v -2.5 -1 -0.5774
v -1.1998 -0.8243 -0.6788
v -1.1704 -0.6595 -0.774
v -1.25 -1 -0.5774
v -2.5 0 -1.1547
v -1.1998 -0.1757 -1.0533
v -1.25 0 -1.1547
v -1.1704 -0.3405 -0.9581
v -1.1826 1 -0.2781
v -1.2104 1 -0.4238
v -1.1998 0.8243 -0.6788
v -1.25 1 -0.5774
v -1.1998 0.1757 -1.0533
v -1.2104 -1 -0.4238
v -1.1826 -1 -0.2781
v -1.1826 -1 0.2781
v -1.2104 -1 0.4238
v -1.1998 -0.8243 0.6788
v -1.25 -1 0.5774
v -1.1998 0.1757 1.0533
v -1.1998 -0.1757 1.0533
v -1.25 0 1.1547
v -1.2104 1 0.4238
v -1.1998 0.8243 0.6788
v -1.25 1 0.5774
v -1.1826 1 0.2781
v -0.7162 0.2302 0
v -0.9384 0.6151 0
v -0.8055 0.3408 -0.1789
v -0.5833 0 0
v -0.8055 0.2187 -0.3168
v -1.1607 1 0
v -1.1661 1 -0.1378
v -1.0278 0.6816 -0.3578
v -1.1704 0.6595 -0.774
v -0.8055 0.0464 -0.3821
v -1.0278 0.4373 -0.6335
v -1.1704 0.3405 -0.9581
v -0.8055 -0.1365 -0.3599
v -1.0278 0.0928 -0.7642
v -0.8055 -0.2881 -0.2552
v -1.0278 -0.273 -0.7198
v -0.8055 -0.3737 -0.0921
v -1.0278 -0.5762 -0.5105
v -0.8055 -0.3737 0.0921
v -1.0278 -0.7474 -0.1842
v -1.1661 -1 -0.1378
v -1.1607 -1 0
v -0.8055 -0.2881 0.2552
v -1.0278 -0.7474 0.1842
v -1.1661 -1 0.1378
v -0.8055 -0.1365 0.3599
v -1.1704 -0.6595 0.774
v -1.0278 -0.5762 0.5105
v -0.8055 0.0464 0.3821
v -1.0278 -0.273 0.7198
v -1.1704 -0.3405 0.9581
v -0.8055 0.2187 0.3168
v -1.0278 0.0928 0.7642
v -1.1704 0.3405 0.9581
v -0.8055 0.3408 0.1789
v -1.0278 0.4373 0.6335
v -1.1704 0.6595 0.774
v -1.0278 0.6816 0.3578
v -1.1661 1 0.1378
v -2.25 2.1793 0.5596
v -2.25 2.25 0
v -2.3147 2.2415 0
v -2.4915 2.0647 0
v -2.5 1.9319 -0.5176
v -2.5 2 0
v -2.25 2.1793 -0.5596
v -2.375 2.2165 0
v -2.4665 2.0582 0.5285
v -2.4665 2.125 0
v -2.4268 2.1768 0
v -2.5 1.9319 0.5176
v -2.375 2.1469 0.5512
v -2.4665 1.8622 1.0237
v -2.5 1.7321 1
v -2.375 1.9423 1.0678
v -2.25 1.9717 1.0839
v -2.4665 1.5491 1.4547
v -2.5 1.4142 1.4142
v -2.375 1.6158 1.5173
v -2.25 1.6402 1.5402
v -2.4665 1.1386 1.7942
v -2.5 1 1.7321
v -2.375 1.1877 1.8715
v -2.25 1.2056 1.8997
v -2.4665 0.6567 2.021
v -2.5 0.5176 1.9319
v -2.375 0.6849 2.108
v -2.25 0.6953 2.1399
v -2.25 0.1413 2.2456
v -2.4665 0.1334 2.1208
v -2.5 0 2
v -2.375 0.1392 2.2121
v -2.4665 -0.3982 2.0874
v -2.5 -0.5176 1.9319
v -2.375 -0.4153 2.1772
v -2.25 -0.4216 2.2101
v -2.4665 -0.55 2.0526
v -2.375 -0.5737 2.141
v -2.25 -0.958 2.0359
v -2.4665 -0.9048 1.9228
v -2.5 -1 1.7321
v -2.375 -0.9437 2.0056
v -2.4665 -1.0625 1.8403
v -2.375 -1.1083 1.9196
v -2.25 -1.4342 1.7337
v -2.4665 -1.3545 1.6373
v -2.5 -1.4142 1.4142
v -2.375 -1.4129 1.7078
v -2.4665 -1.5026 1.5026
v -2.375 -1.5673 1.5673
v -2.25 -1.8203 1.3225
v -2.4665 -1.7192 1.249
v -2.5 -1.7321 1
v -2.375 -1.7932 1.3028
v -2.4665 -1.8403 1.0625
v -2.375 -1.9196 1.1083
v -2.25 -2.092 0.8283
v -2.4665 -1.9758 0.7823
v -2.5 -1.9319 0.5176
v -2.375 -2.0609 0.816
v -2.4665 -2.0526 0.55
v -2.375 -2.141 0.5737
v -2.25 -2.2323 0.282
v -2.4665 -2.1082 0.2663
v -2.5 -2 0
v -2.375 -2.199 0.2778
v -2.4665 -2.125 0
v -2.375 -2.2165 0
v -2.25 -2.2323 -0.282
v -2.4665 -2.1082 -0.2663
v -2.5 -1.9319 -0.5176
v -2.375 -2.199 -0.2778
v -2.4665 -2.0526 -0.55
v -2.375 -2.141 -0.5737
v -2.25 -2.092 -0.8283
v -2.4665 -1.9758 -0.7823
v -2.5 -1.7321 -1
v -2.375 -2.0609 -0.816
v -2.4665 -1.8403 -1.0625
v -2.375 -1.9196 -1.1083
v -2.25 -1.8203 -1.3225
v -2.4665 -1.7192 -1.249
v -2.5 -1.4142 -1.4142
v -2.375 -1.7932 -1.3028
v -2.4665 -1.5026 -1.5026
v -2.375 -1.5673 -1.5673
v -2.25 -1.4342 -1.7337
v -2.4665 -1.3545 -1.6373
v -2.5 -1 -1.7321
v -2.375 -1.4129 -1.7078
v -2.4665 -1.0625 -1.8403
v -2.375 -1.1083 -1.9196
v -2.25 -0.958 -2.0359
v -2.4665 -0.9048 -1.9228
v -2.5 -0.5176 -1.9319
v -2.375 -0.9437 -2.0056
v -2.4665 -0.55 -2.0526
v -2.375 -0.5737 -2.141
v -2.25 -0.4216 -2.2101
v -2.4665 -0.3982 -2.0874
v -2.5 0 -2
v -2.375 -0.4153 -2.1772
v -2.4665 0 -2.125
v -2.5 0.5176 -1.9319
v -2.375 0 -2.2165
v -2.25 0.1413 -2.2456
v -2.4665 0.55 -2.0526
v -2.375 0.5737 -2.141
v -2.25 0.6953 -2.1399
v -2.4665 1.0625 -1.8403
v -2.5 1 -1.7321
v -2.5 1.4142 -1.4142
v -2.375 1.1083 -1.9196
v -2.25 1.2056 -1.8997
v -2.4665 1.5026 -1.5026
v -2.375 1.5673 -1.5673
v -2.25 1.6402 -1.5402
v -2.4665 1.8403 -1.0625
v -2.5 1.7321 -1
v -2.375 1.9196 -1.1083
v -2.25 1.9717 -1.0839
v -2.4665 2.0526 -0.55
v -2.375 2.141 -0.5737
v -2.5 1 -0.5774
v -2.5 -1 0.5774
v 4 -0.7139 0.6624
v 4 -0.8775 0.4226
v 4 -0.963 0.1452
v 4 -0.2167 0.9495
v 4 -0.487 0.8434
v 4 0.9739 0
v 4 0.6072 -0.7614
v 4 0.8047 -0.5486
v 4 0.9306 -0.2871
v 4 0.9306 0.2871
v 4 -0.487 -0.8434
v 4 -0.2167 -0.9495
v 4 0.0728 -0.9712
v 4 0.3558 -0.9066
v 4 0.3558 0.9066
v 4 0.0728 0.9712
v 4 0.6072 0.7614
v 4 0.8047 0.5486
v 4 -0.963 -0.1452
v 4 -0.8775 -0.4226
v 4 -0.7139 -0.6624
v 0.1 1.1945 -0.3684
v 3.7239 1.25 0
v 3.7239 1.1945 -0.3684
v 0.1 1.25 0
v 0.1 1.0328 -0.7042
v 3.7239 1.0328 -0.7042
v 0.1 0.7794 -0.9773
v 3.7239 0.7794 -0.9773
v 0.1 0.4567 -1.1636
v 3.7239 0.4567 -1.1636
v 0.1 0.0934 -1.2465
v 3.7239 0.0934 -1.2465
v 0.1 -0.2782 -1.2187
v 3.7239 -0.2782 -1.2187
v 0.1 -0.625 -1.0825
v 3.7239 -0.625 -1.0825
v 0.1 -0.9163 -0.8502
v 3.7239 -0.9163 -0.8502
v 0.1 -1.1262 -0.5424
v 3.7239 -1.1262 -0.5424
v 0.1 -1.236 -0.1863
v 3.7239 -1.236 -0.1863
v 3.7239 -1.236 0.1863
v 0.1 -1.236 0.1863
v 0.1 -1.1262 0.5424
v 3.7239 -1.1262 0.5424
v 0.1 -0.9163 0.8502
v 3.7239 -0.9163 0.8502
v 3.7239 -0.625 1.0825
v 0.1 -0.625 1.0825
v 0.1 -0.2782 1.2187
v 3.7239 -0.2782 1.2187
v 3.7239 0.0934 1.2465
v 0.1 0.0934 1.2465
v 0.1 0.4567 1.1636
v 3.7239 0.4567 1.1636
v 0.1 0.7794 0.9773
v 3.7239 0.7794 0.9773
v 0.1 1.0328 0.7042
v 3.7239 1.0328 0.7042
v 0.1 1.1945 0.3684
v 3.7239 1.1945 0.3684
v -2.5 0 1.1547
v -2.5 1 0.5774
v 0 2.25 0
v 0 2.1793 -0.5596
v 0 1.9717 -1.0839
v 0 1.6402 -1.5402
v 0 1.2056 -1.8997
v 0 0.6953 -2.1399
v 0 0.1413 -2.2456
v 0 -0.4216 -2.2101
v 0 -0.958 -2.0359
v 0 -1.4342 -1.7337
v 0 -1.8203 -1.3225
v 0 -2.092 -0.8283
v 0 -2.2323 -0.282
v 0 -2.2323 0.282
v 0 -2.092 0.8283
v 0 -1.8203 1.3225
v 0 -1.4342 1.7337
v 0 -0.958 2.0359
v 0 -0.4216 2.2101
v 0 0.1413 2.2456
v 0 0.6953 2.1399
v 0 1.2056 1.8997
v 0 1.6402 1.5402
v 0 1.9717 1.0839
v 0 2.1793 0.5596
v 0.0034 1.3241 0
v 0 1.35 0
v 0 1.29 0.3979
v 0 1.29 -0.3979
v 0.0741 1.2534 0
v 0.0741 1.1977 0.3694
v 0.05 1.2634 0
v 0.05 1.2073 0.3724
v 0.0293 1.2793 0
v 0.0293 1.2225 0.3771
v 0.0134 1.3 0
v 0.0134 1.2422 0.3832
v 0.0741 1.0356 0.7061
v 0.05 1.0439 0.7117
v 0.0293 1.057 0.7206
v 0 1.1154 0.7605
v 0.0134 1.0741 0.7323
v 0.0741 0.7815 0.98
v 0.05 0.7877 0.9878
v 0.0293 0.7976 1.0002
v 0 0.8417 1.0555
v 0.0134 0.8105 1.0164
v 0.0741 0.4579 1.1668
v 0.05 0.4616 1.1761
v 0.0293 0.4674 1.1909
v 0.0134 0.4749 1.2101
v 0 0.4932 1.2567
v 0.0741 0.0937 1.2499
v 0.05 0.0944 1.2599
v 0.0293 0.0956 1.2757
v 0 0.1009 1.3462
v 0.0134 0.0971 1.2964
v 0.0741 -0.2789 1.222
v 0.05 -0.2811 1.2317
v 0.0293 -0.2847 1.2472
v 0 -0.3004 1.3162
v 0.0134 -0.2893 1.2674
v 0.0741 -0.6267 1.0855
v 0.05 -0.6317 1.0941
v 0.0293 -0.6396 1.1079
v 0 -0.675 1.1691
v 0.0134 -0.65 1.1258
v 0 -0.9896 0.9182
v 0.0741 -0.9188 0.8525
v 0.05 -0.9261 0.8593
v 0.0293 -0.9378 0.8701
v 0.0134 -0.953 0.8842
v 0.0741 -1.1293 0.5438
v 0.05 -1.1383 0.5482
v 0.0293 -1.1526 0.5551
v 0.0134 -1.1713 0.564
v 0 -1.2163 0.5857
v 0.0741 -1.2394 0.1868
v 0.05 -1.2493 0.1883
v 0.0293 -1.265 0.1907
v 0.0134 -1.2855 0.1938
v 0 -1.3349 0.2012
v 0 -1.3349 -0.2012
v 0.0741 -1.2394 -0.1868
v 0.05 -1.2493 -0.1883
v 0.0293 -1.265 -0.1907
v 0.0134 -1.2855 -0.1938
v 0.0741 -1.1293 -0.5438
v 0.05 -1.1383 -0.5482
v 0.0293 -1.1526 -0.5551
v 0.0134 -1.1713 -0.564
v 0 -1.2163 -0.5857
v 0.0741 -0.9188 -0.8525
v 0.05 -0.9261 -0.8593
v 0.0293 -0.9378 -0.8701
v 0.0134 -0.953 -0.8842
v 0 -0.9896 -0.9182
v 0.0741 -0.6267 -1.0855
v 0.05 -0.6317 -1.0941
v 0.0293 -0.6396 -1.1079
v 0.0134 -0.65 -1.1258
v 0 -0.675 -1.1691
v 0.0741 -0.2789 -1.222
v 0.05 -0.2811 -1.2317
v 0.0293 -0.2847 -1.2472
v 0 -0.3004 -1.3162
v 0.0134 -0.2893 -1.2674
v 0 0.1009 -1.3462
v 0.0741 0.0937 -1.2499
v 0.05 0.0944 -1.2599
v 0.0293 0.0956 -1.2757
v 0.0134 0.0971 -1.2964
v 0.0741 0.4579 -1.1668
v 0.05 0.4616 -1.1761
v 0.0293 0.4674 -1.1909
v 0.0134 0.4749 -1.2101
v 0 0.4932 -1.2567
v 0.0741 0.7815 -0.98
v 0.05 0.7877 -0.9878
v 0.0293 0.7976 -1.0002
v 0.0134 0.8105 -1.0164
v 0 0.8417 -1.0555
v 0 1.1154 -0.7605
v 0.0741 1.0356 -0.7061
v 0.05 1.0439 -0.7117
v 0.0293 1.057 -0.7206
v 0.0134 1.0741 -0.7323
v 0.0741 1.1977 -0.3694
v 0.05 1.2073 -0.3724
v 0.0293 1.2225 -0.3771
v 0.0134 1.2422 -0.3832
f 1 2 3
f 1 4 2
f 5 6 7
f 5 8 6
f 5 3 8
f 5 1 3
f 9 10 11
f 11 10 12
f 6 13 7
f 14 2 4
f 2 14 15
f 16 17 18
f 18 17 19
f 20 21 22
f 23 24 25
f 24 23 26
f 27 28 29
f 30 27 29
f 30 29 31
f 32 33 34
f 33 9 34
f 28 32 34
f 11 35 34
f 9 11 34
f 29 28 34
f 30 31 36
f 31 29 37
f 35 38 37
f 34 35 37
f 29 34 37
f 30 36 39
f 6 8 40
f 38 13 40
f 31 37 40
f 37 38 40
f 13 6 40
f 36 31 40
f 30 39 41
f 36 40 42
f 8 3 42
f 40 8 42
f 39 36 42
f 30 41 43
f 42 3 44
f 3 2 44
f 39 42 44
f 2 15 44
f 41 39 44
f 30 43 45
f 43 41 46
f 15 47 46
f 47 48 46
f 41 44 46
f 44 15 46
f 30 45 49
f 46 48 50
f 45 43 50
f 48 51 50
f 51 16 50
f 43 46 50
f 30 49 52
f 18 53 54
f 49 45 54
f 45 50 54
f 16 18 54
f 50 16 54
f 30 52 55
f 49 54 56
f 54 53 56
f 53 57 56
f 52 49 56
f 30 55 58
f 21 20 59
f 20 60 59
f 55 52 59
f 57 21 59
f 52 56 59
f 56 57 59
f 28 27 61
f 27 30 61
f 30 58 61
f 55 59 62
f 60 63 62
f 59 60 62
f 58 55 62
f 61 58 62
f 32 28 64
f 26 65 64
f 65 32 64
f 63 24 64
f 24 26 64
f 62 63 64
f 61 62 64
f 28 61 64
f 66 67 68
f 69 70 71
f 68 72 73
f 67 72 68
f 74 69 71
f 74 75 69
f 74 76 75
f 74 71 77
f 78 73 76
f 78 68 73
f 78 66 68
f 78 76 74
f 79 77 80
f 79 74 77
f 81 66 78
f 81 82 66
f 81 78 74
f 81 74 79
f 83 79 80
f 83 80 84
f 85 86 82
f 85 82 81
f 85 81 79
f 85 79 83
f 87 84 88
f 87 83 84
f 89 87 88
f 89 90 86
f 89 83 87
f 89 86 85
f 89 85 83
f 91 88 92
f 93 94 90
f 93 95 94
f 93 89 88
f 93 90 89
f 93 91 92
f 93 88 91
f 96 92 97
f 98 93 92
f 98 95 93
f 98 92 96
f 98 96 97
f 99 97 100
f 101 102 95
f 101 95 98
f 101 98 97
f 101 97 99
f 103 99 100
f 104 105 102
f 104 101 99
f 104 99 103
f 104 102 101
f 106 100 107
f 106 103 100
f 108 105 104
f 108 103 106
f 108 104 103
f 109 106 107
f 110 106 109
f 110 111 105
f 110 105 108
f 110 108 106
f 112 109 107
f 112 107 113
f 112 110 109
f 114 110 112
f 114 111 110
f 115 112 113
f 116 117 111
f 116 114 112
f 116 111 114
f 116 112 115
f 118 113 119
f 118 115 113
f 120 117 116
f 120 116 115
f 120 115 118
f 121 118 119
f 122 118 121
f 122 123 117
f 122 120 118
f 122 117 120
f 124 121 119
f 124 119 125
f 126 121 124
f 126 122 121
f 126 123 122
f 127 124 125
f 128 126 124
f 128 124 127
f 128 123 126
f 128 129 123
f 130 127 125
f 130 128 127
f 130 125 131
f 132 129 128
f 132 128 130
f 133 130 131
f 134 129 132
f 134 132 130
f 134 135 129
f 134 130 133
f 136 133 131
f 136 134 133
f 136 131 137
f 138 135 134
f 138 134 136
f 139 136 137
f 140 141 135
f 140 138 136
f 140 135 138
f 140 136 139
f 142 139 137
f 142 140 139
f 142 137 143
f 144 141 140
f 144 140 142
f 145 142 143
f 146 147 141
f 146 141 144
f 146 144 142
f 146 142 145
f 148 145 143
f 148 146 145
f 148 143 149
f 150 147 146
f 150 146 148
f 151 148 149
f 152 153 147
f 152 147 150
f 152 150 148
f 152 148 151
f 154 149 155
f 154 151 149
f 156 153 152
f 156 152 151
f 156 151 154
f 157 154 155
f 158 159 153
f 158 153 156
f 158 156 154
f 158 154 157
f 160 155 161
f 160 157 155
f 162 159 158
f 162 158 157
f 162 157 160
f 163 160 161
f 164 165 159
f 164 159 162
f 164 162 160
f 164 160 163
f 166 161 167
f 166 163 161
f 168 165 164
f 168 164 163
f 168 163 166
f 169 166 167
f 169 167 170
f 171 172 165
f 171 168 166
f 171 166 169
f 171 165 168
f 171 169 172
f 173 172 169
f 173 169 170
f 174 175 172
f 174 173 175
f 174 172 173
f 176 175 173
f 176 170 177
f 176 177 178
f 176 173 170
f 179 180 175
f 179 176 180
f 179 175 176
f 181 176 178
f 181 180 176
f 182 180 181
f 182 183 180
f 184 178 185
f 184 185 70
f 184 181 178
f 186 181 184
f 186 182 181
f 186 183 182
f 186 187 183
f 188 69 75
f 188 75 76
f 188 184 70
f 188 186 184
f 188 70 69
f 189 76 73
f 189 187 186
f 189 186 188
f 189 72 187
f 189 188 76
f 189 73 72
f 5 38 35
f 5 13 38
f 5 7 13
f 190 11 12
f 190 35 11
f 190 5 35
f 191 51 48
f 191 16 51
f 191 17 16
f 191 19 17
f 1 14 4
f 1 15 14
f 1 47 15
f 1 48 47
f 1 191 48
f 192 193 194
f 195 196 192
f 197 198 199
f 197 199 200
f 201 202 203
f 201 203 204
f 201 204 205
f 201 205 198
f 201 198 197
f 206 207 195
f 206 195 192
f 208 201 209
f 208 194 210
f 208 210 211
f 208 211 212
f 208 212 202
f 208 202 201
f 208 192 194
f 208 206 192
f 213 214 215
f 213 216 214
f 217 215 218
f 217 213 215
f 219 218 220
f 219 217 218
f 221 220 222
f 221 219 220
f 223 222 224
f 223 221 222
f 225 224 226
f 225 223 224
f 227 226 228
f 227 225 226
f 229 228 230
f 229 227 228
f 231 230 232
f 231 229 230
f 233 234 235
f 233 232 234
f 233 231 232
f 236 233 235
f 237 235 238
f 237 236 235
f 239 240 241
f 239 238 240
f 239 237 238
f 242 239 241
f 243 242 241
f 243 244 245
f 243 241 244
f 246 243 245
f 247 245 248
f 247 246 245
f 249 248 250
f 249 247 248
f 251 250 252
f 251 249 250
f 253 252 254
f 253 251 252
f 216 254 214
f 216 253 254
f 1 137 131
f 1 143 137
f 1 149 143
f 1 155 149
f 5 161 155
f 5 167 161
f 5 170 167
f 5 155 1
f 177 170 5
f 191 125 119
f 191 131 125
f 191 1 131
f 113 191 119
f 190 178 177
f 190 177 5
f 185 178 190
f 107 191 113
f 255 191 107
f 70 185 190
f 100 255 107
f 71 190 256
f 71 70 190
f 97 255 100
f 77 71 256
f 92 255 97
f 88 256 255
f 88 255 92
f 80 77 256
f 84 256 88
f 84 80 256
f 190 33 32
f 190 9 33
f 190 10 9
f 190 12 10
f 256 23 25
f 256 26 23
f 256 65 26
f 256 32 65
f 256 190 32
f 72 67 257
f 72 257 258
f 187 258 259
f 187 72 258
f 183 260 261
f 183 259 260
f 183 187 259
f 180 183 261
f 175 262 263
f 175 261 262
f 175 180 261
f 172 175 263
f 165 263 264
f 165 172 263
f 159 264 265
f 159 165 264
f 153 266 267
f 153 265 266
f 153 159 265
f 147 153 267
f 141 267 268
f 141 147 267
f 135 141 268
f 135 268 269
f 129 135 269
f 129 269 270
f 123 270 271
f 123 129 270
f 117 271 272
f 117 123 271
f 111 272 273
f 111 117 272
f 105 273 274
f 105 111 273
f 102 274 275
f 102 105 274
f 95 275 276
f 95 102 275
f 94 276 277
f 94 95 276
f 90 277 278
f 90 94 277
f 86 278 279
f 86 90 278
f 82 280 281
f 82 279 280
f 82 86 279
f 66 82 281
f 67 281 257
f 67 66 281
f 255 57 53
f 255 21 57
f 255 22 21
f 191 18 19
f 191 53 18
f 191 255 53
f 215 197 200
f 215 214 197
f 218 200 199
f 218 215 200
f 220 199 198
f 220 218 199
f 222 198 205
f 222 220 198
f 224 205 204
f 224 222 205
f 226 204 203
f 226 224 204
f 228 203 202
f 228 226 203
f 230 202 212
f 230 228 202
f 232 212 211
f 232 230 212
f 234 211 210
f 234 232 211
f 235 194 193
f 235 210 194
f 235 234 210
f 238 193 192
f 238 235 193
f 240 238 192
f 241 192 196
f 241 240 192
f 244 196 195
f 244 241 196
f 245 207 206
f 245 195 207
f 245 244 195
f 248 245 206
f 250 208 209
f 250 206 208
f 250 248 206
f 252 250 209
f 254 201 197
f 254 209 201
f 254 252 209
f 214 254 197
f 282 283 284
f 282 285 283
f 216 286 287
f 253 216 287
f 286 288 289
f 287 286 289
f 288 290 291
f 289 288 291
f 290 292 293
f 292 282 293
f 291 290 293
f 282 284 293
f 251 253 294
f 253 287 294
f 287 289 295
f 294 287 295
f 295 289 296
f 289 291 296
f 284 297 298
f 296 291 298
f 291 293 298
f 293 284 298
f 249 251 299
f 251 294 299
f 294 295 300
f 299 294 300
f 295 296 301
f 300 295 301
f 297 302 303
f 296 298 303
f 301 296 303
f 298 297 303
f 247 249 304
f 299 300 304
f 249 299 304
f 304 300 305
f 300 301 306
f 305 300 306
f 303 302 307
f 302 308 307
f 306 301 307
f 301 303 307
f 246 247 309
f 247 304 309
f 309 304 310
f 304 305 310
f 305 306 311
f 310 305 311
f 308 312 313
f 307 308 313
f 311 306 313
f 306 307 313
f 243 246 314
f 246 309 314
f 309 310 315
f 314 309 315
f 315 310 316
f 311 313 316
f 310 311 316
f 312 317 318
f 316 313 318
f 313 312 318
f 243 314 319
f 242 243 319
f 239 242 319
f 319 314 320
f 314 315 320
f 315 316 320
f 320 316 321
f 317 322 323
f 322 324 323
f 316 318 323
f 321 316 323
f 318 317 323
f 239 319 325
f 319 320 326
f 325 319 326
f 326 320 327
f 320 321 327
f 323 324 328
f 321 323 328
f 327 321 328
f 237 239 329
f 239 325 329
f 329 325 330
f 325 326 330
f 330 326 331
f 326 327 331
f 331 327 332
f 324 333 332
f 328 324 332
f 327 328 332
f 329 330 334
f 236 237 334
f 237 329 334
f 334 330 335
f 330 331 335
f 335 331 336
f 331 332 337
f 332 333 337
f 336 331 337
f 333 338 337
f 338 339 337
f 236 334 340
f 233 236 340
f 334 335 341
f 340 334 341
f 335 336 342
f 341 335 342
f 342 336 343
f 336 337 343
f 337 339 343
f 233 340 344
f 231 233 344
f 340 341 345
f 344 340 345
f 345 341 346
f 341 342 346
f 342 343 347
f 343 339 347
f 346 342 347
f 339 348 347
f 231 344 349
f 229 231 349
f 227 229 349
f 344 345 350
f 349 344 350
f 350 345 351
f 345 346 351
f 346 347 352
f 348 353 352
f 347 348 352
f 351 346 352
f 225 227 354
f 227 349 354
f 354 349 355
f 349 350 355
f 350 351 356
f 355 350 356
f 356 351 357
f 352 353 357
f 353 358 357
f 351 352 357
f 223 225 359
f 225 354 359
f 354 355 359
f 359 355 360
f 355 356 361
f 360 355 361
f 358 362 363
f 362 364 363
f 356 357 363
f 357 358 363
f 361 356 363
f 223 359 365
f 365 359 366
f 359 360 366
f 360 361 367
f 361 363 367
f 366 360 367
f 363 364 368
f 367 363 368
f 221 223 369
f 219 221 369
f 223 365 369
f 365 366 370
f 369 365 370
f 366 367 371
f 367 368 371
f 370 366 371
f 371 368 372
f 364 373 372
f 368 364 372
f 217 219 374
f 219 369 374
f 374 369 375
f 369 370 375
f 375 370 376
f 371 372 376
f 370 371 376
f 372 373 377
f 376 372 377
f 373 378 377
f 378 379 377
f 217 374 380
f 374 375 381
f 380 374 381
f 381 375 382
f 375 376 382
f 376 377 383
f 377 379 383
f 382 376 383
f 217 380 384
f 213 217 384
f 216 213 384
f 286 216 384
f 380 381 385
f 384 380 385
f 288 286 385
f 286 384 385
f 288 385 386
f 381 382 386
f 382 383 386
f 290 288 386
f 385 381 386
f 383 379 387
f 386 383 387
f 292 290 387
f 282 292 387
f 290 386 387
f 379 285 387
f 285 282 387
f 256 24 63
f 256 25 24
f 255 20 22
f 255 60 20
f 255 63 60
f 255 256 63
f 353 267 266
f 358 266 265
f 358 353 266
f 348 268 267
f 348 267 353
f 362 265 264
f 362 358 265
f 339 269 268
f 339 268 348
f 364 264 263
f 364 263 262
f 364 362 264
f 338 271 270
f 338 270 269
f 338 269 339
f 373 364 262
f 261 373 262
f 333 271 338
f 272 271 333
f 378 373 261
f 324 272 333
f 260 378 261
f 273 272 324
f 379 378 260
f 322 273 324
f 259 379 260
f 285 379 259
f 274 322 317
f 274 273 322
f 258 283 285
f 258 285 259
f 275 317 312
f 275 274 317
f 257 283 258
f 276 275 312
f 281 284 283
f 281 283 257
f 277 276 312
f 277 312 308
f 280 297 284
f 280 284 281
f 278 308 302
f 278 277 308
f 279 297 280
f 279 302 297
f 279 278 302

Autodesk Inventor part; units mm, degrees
ref_plane "YZ Plane" through (0, 0, 0) normal (1, 0, 0) x (0, 1, 0)
ref_plane "XZ Plane" through (0, 0, 0) normal (0, 1, 0) x (-1, 0, 0)
sketch "Sketch1" plane through (0, 0, 0) normal (0, 0, 1) x (1, 0, 0)
  line L0 (-0.5833, 0) -> (4, 0)
  line L1 (4, 0) -> (4, 1.25)
  line L2 (4, 1.25) -> (1.1761, 1.25)
  line L3 (1.1761, 1.25) -> (0.8999, 1.25)
  line L4 (0.8999, 1.25) -> (0, 1.25)
  line L5 (0, 1.25) -> (0, 2.25)
  line L6 (0, 2.25) -> (-2.5, 2.25)
  line L7 (-2.5, 2.25) -> (-2.5, 1.1547)
  line L8 (-2.5, 1.1547) -> (-1.25, 1.1547)
  line L9 (-1.25, 1.1547) -> (-0.5833, 0)
  line L10 (-3.8, 0) -> (5.3, 0) projected
  line L11 (0, -0.45) -> (0, 2.7) projected
  line L12 (1.1761, 1.25) -> (0, 1.25) construction
  dimension "d1" = 2.8239
  dimension "d2" = 0.2762
  dimension "d3" = 2.5
  dimension "d4" = 1.25
  dimension "d5" = 60
  dimension "d6" = 2.5
  dimension "d7" = 2.5
  dimension "d8" = 2.3094
  dimension "d9" = 4.5
  dimension "d26" = 4
revolve "Body" add sketch "Sketch1" angle 360 about axis through (-0.5833, 0, 0) along (1, 0, 0)
sketch "Sketch2" plane through (-2.5, 0, 0) normal (-1, 0, 0) x (0, 0, 1)
  circle A0 centre (0, 0) radius 1.1547 projected
  line L0 (0, -3.15) -> (0, 3.15) projected
  line L1 (-3.15, 0) -> (3.15, 0) projected
  line L2 (1.1547, 0) -> (0.5774, -1)
  line L3 (0.5774, -1) -> (-0.5774, -1)
  line L4 (-0.5774, -1) -> (-1.1547, 0)
  line L5 (-1.1547, 0) -> (-0.5774, 1)
  line L6 (-0.5774, 1) -> (0.5774, 1)
  line L7 (0.5774, 1) -> (1.1547, 0)
extrude "Slot" add sketch "Sketch2" against normal up to next contours L7 A0 | A0 L2 | L6 L0 A0 | A0 L0 L3 | L0 L6 A0 | A0 L3 L0 | L4 A0 | A0 L5
fillet "Fillet1" radius 0.25 1 edges at (-2.5, -2.25, 0)
thread "Thread" size "M2.5x0.45" class "6g" standard "ISO Metric profile" length 2.8239
chamfer "Chamfer1" distance 0.2761 distance2 0.2761 1 edges at (4, -1.25, 0) measured on face at (4, -0.1825, -0.5629)
ref_plane "Work Plane1" through (29, 0, 0) normal (0, -1, 0) x (1, 0, 0)
fillet "Fillet2" radius 0.1 1 edges at (0, -1.25, 0)
equation "\"d30\" = R"
equation "\"d17\" = RR"
equation "\"d13\" = GEL"
equation "\"d15\" = -0.5 * SPD + 0.5 * GD"
equation "\"d16\" = GUL"
equation "\"d1\" = GEL"
equation "\"d3\" = KOH"
equation "\"d4\" = INTI"
equation "\"d6\" = GD"
equation "\"d7\" = BDM"
equation "\"d8\" = 1.1547 * SW"
equation "\"d9\" = KOD"
equation "\"d26\" = NLG"
equation "\"GD\" = NND"
equation "\"NLG\" = 4"
equation "\"GEL\" = 2.82395"
equation "\"KOD\" = 4.5"
equation "\"KOH\" = 2.5"
equation "\"INTI\" = 1.25"
equation "\"GAL\" = 0.61345 * PTC"
equation "\"GUL\" = 0.61345 * PTC"
equation "\"BDM\" = NND"
equation "\"SW\" = 2"
equation "\"RR\" = 0.25"
equation "\"SPD\" = 1.94789"
equation "\"R\" = 0.1"
equation "\"TOA\" = 30deg"
equation "\"THREADDIA\" = 2.5"
equation "\"PTC\" = 0.45"
equation "\"NND\" = 2.5"
equation "\"E0\" = 1.155 * SW"
equation "\"GD1\" = THREADDIA - 1.2269 * PTC"
properties part number "ANSI B18.3.1M - M2.5x0.45 x 4" material "Steel, Mild"
